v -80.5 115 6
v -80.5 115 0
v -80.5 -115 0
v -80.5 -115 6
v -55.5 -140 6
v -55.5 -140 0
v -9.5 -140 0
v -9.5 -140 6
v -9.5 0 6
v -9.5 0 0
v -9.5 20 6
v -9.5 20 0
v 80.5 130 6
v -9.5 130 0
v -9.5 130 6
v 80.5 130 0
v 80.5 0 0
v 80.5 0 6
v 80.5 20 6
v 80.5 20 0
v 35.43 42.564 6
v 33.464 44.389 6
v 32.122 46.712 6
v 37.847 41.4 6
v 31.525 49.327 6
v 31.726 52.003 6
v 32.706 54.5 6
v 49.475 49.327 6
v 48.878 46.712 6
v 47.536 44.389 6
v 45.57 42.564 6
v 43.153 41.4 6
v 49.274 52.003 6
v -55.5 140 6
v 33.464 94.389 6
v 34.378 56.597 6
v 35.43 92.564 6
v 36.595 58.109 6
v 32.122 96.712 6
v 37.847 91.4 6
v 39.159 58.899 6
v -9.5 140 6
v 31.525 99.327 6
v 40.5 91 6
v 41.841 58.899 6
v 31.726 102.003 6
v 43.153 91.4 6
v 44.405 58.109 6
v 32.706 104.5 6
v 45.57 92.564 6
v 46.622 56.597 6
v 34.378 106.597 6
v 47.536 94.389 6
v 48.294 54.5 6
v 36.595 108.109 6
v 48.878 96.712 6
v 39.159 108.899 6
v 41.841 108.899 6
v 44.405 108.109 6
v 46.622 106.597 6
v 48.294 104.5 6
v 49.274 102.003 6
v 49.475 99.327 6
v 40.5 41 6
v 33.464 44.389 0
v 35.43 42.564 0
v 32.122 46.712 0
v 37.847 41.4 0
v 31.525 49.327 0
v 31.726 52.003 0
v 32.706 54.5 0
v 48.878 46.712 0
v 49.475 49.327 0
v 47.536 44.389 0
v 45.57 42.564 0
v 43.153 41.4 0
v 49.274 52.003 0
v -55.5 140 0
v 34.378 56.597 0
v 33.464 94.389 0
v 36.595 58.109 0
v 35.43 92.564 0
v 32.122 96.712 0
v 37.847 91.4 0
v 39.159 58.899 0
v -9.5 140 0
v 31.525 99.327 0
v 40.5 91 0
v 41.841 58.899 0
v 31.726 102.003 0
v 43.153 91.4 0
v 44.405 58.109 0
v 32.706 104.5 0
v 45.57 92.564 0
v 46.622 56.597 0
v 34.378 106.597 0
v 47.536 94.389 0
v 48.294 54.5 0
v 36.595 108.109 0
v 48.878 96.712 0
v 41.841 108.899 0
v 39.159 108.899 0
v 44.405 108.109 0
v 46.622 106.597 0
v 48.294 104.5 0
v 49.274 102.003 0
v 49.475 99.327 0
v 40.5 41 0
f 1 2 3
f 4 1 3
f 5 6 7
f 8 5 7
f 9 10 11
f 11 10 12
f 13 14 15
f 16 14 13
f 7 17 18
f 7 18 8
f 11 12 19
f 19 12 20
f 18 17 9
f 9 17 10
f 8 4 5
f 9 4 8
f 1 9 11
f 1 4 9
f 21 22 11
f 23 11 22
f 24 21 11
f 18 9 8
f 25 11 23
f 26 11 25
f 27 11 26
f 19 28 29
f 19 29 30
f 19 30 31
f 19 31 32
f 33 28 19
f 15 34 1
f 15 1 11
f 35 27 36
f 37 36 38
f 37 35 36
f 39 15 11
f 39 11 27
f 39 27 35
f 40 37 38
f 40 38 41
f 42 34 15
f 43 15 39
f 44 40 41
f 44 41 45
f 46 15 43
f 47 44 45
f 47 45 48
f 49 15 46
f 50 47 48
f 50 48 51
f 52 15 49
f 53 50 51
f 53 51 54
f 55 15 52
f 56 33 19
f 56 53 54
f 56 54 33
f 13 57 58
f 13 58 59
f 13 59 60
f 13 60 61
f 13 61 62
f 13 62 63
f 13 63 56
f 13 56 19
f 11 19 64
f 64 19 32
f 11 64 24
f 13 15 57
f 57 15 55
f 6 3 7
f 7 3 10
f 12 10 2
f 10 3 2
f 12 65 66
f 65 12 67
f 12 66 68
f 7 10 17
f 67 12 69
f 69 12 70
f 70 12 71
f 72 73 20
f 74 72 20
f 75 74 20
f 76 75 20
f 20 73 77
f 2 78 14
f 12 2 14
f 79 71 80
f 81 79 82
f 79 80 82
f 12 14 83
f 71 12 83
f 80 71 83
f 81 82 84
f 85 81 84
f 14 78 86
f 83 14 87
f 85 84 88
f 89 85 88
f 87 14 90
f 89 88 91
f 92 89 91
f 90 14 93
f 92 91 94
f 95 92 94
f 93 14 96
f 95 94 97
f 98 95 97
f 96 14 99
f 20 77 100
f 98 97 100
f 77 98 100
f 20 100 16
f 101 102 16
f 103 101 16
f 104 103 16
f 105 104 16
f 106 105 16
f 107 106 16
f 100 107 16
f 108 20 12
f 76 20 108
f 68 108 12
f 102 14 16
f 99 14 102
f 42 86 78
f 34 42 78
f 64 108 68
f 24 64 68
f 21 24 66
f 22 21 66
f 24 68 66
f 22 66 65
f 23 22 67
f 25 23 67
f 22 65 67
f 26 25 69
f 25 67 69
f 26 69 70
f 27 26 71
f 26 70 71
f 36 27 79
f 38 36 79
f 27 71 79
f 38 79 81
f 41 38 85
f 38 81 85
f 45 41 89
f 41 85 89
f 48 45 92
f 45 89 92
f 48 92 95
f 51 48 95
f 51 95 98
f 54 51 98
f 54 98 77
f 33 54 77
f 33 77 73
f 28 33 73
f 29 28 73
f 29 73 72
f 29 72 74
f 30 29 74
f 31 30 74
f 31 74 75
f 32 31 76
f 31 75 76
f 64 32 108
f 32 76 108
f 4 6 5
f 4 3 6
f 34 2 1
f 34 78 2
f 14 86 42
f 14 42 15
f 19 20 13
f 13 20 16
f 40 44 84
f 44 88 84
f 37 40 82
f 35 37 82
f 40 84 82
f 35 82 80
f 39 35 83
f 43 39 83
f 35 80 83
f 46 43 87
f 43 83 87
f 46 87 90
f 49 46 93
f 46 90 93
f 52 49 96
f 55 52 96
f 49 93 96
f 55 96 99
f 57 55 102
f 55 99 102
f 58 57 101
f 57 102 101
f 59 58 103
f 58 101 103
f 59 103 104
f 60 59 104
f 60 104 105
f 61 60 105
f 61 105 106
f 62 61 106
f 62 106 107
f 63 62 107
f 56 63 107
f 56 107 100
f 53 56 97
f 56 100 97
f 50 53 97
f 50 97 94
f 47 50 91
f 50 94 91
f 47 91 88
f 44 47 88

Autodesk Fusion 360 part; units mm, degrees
sketch "スケッチ1" plane through (0, 0, 0) normal (0, 0, 1) x (1, 0, 0)
  line L0 (-9.5, 140) -> (-80.5, 140)
  line L1 (-80.5, 140) -> (-80.5, -140)
  line L2 (-80.5, -140) -> (-9.5, -140)
  line L3 (80.5, 20) -> (80.5, 130)
  line L4 (74.75, 130) -> (-80.5, -140) construction
  line L5 (-80.5, 140) -> (38.0073, -66.0997) construction
  line L6 (-9.5, 140) -> (-9.5, 130)
  line L7 (-9.5, 130) -> (80.5, 130)
  line L8 (-80.5, -140) -> (-9.5, -140) construction
  line L9 (80.5, 0) -> (-9.5, -140)
  line L10 (80.5, 0) -> (-9.5, 0)
  line L11 (-9.5, 0) -> (-9.5, 20)
  line L12 (-9.5, 20) -> (80.5, 20)
  dimension "d2" = 280
  dimension "d5" = 71
  dimension "d7" = 90
  dimension "d8" = 20
extrude "押し出し1" add sketch "スケッチ1" along normal blind 6
chamfer "面取り1" distance 25 angle 45 2 edges at (-80.5, -140, 3) (-80.5, 140, 3)
sketch "スケッチ2" plane through (0, 0, 6) normal (0, 0, 1) x (-1, 0, 0)
  line L0 (55.5, -140) -> (80.5, -115)
  line L1 (80.5, -115) -> (80.5, 115)
  line L2 (80.5, 115) -> (55.5, 140)
  line L3 (55.5, 140) -> (9.5, 140)
  line L4 (9.5, 140) -> (-80.5, 0)
  line L5 (-80.5, 0) -> (9.5, 0)
  line L6 (9.5, 0) -> (9.5, -20)
  line L7 (9.5, -20) -> (-80.5, -20)
  line L8 (-80.5, -20) -> (-80.5, -130)
  line L9 (-80.5, -130) -> (9.5, -130)
  line L10 (9.5, -130) -> (9.5, -140)
  line L11 (9.5, -140) -> (55.5, -140)
  line L12 (-80.5, -130) -> (-40.5, -130) construction
  line L13 (-40.5, -130) -> (-40.5, -100) construction
  line L14 (-40.5, -100) -> (-80.5, -100) construction
  line L15 (-80.5, -100) -> (-80.5, -130) construction
  line L16 (-40.5, -100) -> (-40.5, -50) construction
  point P0 (-40.5, -100)
  point P1 (-40.5, -50)
  dimension "d12" = 40
  dimension "d13" = 30
  dimension "d14" = 50
hole "穴1" at (40.5, 100, 6) at (40.5, 50, 6) direction (0, 0, -1) diameter 18 end through all
equation "d5 = 25 mm + 46 mm"
